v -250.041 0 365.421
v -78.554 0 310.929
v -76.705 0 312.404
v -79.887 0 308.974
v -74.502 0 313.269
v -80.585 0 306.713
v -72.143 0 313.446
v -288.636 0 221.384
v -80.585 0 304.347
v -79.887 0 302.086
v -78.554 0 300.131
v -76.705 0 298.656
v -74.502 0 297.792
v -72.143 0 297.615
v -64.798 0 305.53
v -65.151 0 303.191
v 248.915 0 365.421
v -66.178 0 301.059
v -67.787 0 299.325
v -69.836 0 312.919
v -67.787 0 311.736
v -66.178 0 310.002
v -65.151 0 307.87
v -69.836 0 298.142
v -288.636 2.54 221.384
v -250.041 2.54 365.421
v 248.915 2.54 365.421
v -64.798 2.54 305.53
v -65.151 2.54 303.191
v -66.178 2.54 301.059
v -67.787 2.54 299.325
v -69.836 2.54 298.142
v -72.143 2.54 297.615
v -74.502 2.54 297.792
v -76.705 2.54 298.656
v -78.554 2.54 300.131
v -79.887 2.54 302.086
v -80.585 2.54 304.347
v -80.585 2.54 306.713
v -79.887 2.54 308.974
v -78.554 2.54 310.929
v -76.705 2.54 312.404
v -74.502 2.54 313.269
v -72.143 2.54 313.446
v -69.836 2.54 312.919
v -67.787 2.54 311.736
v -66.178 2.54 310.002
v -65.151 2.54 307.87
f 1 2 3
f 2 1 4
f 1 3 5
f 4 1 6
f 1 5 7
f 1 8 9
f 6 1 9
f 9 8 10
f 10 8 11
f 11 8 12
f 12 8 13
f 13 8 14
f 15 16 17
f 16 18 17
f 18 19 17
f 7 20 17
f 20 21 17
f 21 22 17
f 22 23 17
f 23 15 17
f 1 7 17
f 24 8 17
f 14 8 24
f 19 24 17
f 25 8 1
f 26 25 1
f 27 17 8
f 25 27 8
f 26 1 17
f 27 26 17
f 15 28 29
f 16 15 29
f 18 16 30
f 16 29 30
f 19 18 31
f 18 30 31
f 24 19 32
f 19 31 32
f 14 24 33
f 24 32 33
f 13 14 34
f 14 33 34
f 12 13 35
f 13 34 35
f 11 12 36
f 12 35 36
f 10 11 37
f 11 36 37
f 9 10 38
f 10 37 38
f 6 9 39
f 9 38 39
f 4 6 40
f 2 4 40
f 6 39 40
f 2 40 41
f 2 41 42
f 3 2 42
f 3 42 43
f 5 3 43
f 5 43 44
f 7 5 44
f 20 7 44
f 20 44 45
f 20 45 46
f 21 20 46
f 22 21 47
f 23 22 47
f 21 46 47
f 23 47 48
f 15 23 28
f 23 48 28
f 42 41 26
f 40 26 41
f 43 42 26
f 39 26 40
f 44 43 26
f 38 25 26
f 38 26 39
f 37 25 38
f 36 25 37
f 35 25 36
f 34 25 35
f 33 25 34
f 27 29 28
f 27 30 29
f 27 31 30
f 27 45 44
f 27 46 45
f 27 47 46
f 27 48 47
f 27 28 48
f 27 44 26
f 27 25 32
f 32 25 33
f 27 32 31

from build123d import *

# Parameters (mm, degrees)
BOSS_EXTRUDE1_DEPTH = 2.54
SKETCH2_R           = 7.9375
CUT_EXTRUDE1_DEPTH  = 2.54
CUT_EXTRUDE2_DEPTH  = 2.54


with BuildPart() as part:
    # Sketch1 → Boss-Extrude1 (new body)
    with BuildSketch(Plane(origin=(0, 0, 0), x_dir=(1, 0, 0), z_dir=(0, 1, 0))):
        Polygon((-288.635862607, -221.384099055), (-288.635862607, -365.420521122), (248.915382685, -365.420521122), align=None)
    extrude(amount=BOSS_EXTRUDE1_DEPTH)

    # Sketch2 → Cut-Extrude1 (cut)
    with BuildSketch(Plane(origin=(0, 2.54, 0), x_dir=(1, 0, 0), z_dir=(0, 1, 0))):
        with Locations((-72.735862607, -305.530344684)):
            Circle(SKETCH2_R)
    extrude(amount=-CUT_EXTRUDE1_DEPTH, mode=Mode.SUBTRACT)

    # Sketch3 → Cut-Extrude2 (cut)
    with BuildSketch(Plane.XZ):
        Polygon((-288.635862607, 221.384099055), (-250.041419634, 365.420521122), (-288.635862607, 365.420521122), align=None)
    extrude(amount=-CUT_EXTRUDE2_DEPTH, mode=Mode.SUBTRACT)


solid = part.part
